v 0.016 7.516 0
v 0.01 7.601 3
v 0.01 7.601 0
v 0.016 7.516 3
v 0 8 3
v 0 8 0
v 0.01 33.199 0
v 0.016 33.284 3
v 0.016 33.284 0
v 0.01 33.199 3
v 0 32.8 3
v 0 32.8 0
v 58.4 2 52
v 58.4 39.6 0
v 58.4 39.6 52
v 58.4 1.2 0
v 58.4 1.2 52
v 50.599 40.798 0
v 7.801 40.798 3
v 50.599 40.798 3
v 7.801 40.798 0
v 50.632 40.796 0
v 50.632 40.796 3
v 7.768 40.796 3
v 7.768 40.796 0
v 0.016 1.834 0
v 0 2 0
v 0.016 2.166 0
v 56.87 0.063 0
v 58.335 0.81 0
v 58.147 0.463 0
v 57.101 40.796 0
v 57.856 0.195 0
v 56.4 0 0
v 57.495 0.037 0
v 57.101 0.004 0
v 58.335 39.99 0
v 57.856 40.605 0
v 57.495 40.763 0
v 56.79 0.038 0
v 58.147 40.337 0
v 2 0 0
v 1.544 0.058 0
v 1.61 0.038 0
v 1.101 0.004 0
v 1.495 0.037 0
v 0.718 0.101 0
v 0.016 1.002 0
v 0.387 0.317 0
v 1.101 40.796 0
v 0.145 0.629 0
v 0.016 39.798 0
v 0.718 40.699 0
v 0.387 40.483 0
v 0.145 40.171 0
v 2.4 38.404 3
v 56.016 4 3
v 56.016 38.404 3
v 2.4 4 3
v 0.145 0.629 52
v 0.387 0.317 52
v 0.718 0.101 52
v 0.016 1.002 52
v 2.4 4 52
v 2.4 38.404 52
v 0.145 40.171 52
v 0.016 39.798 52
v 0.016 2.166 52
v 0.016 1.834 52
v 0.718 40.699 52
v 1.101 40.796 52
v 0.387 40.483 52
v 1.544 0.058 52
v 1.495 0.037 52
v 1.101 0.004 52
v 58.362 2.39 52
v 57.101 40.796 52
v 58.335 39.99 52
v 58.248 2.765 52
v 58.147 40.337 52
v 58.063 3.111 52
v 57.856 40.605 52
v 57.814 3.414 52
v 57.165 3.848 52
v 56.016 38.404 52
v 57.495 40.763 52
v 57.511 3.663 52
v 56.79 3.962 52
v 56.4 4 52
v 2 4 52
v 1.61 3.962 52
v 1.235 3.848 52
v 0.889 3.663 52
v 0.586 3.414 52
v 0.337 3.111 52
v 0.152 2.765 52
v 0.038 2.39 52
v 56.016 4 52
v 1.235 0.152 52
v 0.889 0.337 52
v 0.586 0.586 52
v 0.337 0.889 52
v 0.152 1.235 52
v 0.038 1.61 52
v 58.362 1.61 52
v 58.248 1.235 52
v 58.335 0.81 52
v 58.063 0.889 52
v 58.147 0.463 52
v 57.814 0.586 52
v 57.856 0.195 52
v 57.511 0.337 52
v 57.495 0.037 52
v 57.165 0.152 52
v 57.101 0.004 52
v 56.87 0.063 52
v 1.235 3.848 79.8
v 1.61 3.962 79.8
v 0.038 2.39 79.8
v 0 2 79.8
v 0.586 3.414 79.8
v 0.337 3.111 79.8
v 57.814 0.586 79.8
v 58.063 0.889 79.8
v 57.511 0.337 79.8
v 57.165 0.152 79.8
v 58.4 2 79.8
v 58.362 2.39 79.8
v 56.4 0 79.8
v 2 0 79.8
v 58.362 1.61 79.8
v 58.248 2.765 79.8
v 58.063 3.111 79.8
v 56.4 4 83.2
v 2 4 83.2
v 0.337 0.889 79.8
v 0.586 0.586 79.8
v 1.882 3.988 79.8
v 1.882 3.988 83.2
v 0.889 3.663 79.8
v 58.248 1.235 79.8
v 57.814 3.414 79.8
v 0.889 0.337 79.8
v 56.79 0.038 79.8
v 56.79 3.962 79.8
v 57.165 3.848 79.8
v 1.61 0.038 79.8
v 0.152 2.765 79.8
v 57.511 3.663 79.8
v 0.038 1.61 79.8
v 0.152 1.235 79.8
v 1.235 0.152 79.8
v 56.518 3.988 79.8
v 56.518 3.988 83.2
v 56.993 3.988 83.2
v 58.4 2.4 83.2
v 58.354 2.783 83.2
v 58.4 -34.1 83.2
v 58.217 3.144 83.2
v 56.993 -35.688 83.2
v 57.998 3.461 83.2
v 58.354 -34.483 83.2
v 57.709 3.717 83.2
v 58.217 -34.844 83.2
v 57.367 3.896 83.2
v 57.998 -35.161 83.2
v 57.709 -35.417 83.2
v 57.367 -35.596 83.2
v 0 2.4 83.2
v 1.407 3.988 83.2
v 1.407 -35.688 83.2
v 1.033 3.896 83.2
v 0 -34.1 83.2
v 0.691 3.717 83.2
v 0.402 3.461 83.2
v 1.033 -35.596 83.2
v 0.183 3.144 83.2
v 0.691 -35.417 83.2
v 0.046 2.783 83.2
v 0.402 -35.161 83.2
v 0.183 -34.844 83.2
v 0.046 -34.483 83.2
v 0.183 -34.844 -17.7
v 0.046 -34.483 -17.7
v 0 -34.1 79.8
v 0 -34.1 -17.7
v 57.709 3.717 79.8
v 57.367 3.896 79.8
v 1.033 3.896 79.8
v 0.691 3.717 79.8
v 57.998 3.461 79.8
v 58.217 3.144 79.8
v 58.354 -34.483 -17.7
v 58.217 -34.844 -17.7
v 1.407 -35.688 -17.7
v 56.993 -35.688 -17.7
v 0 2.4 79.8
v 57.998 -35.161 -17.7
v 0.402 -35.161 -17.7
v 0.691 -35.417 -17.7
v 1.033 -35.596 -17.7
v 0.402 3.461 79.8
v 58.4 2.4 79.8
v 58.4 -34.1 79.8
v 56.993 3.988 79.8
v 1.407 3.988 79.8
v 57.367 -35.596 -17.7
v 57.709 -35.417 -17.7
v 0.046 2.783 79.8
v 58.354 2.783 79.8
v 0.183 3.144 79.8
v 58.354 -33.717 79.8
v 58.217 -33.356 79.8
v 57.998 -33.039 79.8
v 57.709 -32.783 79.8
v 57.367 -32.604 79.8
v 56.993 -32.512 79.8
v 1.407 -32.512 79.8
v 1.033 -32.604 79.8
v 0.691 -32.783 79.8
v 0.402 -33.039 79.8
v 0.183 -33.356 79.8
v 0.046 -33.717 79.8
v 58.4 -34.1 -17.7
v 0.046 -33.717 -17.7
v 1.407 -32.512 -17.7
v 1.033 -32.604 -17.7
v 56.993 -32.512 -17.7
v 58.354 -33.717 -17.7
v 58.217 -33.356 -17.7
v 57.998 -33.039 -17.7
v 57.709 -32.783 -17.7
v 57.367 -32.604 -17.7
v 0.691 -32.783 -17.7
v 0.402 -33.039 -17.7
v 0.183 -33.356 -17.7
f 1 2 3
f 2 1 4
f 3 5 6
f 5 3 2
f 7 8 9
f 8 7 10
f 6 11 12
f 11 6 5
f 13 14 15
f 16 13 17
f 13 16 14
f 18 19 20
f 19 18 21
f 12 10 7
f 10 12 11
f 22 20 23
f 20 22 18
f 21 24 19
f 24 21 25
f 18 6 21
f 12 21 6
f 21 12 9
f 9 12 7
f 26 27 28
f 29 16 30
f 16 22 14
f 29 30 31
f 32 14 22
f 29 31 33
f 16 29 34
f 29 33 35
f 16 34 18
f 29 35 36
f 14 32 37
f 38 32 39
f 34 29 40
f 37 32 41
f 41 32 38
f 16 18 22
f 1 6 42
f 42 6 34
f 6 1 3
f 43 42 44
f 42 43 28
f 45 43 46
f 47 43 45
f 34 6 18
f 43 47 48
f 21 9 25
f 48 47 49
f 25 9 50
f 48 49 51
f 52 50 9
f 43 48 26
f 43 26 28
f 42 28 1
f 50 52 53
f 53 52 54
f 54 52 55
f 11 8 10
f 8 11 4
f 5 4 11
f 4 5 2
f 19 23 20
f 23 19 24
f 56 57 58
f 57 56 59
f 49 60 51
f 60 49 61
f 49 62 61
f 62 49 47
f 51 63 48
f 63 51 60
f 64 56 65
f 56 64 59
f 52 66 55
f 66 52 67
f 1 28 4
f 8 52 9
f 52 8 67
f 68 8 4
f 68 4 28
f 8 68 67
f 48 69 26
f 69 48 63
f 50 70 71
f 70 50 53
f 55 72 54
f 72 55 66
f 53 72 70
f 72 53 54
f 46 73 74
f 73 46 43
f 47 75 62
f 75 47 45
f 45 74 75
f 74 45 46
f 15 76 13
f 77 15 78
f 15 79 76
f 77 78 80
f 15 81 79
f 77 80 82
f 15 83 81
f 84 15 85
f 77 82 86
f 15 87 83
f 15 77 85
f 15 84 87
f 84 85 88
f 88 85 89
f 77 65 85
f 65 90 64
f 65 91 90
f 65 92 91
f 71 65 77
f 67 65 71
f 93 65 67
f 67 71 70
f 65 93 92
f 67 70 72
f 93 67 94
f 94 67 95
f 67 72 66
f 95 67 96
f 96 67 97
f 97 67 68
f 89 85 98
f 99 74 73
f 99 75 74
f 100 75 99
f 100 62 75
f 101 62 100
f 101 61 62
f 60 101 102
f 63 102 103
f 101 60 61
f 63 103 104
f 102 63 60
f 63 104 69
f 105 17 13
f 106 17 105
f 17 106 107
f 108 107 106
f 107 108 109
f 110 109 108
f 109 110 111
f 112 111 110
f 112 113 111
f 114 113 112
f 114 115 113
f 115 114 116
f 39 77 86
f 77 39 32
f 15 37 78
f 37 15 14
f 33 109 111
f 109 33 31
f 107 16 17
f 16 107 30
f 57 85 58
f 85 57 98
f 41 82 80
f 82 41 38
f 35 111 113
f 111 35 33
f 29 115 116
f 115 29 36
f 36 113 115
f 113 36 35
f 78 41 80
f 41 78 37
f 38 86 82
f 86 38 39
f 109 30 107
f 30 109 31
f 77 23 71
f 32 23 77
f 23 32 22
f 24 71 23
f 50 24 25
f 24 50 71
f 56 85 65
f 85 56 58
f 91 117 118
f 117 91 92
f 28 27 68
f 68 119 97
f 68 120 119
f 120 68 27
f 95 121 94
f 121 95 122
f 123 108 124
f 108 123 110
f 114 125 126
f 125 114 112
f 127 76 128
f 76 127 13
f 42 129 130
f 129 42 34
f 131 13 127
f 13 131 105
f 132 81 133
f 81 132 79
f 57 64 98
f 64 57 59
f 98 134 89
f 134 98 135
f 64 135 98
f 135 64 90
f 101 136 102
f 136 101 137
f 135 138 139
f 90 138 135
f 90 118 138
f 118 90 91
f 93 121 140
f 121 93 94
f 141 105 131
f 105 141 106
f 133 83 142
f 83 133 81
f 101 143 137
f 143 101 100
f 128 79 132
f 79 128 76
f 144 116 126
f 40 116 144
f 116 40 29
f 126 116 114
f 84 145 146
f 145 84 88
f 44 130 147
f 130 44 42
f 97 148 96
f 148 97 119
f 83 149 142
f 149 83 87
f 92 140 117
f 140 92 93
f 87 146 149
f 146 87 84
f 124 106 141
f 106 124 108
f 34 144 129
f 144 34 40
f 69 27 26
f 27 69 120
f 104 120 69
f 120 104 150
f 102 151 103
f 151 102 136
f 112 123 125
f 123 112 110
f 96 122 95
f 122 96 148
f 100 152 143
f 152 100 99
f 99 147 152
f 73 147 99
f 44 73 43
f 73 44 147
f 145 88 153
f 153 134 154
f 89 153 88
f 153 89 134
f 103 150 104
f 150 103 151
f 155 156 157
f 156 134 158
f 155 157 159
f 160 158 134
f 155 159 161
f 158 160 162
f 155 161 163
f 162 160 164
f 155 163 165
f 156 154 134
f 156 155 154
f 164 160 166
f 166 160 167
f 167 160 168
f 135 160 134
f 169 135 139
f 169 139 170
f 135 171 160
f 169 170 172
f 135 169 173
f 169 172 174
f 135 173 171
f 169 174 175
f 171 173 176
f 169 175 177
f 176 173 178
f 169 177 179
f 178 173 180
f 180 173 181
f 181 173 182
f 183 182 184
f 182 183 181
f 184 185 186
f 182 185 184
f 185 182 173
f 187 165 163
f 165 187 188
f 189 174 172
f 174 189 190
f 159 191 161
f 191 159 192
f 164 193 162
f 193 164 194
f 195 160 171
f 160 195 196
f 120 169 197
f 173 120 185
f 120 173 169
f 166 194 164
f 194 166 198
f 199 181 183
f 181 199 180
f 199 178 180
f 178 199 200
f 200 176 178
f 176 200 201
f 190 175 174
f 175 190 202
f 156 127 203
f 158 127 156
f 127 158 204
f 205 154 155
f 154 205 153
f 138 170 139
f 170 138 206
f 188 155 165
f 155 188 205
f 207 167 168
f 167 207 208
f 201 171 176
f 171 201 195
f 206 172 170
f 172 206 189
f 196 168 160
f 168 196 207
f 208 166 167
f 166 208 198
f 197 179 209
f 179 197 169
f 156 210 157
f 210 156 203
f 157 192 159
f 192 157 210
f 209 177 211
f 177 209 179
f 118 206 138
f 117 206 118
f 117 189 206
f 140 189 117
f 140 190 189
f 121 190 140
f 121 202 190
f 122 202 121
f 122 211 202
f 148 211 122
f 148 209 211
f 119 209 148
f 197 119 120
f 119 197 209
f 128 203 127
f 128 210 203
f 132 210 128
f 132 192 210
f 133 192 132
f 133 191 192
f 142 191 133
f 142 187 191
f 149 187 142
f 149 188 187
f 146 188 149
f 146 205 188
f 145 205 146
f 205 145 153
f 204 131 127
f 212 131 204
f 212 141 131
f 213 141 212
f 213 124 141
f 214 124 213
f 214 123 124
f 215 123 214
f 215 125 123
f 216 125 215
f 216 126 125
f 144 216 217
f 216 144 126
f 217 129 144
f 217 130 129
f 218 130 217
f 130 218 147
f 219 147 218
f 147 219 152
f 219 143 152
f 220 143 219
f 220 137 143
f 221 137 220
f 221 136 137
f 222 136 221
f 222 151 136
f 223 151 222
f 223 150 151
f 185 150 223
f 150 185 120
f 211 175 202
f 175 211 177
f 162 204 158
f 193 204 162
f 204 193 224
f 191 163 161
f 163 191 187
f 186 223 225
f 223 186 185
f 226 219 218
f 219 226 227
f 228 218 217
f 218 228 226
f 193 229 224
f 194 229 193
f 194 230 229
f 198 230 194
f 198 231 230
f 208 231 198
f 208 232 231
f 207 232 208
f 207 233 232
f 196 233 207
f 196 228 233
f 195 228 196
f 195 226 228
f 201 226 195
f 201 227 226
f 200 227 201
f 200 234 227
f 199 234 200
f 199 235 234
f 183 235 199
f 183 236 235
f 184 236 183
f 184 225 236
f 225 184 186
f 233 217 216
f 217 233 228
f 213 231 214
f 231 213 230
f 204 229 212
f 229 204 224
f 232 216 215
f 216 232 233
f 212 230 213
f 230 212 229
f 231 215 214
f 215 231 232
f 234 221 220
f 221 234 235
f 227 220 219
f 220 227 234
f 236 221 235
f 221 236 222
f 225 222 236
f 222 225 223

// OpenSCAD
/*
Creator
*****************
Constantin Ganshin


Project name:
*****************
bed_remote_control_holder


Description:
****************************************
Remote control holder for a bed frame.
The hook slides between the mattress and the bed frame,
and the lower pocket keeps the remote easy to reach
without holding it too tightly.

Notes:
****************************************
Remote control size: 50 x 30 x 140 mm
Pocket height is kept at about 35 percent of the remote height.
Extra clearance is added to avoid scratches and make removal easy.

*/

// Resolution variables
$fa = 1;
$fs = 0.4;

// Remote dimensions
remote_width = 50;
remote_depth = 30;
remote_height = 140;

// Bed dimensions
bed_frame_width = 30;

// Fit and strength tuning
side_clearance = 1.8;
depth_clearance = 2.2;
wall_thickness = 2.4;
back_plate_thickness = 4;
pocket_bottom_thickness = 3;
tongue_thickness = 3.2;
frame_fit_clearance = 2.5;
inner_hook_drop = 97.5;
top_margin_above_pocket = 28;
join_overlap = 0.2;
corner_radius = 4;
pocket_outer_corner_radius = 8;

// Calculated dimensions
pocket_height = remote_height * 0.35;
pocket_inner_width = remote_width + (side_clearance * 2);
pocket_inner_depth = remote_depth + (depth_clearance * 2);
pocket_outer_width = pocket_inner_width + (wall_thickness * 2);
pocket_outer_depth = back_plate_thickness + pocket_inner_depth + wall_thickness;
hook_inner_gap = bed_frame_width + frame_fit_clearance;
hook_total_depth = back_plate_thickness + hook_inner_gap + tongue_thickness;
back_plate_height = pocket_bottom_thickness + pocket_height + top_margin_above_pocket + tongue_thickness;
pocket_body_height = pocket_bottom_thickness + pocket_height;
front_wall_height = pocket_height;

module rounded_box(size, radius) {
    safe_radius = min(radius, size[0] / 2, size[1] / 2);

    linear_extrude(height = size[2])
        hull() {
            translate([safe_radius, safe_radius, 0])
                circle(r = safe_radius);
            translate([size[0] - safe_radius, safe_radius, 0])
                circle(r = safe_radius);
            translate([safe_radius, size[1] - safe_radius, 0])
                circle(r = safe_radius);
            translate([size[0] - safe_radius, size[1] - safe_radius, 0])
                circle(r = safe_radius);
        }
}

module pocket() {
    union() {
        // Pocket floor
        rounded_box([pocket_outer_width, pocket_outer_depth, pocket_bottom_thickness], pocket_outer_corner_radius);

        // Left side wall
        rounded_box([wall_thickness, pocket_outer_depth, pocket_body_height], wall_thickness / 2);

        // Right side wall
        translate([pocket_outer_width - wall_thickness, 0, 0])
            rounded_box([wall_thickness, pocket_outer_depth, pocket_body_height], wall_thickness / 2);

        // Lower front wall for easier gripping and insertion
        translate([0, pocket_outer_depth - wall_thickness, 0])
            rounded_box([pocket_outer_width, wall_thickness, pocket_bottom_thickness + front_wall_height], wall_thickness / 2);
    }
}

module pocket_back_wall() {
    rounded_box([pocket_outer_width, back_plate_thickness, pocket_body_height], back_plate_thickness / 2);
}

module hook_back_wall_upper() {
    translate([0, 0, pocket_body_height - join_overlap])
        rounded_box([pocket_outer_width, back_plate_thickness, back_plate_height - pocket_body_height + join_overlap], back_plate_thickness / 2);
}

module top_hook() {
    translate([0, -(hook_inner_gap + tongue_thickness), back_plate_height - tongue_thickness - join_overlap])
        rounded_box([pocket_outer_width, hook_total_depth, tongue_thickness + join_overlap], tongue_thickness / 2);
}

module inner_hook_leg() {
    translate([0, -(hook_inner_gap + tongue_thickness), back_plate_height - tongue_thickness - inner_hook_drop - join_overlap])
        rounded_box([pocket_outer_width, tongue_thickness, inner_hook_drop + join_overlap], tongue_thickness / 2);
}

module bed_remote_control_holder() {
    union() {
        pocket();
        pocket_back_wall();
        hook_back_wall_upper();
        top_hook();
        inner_hook_leg();
    }
}

render(convexity = 10)
    bed_remote_control_holder();
